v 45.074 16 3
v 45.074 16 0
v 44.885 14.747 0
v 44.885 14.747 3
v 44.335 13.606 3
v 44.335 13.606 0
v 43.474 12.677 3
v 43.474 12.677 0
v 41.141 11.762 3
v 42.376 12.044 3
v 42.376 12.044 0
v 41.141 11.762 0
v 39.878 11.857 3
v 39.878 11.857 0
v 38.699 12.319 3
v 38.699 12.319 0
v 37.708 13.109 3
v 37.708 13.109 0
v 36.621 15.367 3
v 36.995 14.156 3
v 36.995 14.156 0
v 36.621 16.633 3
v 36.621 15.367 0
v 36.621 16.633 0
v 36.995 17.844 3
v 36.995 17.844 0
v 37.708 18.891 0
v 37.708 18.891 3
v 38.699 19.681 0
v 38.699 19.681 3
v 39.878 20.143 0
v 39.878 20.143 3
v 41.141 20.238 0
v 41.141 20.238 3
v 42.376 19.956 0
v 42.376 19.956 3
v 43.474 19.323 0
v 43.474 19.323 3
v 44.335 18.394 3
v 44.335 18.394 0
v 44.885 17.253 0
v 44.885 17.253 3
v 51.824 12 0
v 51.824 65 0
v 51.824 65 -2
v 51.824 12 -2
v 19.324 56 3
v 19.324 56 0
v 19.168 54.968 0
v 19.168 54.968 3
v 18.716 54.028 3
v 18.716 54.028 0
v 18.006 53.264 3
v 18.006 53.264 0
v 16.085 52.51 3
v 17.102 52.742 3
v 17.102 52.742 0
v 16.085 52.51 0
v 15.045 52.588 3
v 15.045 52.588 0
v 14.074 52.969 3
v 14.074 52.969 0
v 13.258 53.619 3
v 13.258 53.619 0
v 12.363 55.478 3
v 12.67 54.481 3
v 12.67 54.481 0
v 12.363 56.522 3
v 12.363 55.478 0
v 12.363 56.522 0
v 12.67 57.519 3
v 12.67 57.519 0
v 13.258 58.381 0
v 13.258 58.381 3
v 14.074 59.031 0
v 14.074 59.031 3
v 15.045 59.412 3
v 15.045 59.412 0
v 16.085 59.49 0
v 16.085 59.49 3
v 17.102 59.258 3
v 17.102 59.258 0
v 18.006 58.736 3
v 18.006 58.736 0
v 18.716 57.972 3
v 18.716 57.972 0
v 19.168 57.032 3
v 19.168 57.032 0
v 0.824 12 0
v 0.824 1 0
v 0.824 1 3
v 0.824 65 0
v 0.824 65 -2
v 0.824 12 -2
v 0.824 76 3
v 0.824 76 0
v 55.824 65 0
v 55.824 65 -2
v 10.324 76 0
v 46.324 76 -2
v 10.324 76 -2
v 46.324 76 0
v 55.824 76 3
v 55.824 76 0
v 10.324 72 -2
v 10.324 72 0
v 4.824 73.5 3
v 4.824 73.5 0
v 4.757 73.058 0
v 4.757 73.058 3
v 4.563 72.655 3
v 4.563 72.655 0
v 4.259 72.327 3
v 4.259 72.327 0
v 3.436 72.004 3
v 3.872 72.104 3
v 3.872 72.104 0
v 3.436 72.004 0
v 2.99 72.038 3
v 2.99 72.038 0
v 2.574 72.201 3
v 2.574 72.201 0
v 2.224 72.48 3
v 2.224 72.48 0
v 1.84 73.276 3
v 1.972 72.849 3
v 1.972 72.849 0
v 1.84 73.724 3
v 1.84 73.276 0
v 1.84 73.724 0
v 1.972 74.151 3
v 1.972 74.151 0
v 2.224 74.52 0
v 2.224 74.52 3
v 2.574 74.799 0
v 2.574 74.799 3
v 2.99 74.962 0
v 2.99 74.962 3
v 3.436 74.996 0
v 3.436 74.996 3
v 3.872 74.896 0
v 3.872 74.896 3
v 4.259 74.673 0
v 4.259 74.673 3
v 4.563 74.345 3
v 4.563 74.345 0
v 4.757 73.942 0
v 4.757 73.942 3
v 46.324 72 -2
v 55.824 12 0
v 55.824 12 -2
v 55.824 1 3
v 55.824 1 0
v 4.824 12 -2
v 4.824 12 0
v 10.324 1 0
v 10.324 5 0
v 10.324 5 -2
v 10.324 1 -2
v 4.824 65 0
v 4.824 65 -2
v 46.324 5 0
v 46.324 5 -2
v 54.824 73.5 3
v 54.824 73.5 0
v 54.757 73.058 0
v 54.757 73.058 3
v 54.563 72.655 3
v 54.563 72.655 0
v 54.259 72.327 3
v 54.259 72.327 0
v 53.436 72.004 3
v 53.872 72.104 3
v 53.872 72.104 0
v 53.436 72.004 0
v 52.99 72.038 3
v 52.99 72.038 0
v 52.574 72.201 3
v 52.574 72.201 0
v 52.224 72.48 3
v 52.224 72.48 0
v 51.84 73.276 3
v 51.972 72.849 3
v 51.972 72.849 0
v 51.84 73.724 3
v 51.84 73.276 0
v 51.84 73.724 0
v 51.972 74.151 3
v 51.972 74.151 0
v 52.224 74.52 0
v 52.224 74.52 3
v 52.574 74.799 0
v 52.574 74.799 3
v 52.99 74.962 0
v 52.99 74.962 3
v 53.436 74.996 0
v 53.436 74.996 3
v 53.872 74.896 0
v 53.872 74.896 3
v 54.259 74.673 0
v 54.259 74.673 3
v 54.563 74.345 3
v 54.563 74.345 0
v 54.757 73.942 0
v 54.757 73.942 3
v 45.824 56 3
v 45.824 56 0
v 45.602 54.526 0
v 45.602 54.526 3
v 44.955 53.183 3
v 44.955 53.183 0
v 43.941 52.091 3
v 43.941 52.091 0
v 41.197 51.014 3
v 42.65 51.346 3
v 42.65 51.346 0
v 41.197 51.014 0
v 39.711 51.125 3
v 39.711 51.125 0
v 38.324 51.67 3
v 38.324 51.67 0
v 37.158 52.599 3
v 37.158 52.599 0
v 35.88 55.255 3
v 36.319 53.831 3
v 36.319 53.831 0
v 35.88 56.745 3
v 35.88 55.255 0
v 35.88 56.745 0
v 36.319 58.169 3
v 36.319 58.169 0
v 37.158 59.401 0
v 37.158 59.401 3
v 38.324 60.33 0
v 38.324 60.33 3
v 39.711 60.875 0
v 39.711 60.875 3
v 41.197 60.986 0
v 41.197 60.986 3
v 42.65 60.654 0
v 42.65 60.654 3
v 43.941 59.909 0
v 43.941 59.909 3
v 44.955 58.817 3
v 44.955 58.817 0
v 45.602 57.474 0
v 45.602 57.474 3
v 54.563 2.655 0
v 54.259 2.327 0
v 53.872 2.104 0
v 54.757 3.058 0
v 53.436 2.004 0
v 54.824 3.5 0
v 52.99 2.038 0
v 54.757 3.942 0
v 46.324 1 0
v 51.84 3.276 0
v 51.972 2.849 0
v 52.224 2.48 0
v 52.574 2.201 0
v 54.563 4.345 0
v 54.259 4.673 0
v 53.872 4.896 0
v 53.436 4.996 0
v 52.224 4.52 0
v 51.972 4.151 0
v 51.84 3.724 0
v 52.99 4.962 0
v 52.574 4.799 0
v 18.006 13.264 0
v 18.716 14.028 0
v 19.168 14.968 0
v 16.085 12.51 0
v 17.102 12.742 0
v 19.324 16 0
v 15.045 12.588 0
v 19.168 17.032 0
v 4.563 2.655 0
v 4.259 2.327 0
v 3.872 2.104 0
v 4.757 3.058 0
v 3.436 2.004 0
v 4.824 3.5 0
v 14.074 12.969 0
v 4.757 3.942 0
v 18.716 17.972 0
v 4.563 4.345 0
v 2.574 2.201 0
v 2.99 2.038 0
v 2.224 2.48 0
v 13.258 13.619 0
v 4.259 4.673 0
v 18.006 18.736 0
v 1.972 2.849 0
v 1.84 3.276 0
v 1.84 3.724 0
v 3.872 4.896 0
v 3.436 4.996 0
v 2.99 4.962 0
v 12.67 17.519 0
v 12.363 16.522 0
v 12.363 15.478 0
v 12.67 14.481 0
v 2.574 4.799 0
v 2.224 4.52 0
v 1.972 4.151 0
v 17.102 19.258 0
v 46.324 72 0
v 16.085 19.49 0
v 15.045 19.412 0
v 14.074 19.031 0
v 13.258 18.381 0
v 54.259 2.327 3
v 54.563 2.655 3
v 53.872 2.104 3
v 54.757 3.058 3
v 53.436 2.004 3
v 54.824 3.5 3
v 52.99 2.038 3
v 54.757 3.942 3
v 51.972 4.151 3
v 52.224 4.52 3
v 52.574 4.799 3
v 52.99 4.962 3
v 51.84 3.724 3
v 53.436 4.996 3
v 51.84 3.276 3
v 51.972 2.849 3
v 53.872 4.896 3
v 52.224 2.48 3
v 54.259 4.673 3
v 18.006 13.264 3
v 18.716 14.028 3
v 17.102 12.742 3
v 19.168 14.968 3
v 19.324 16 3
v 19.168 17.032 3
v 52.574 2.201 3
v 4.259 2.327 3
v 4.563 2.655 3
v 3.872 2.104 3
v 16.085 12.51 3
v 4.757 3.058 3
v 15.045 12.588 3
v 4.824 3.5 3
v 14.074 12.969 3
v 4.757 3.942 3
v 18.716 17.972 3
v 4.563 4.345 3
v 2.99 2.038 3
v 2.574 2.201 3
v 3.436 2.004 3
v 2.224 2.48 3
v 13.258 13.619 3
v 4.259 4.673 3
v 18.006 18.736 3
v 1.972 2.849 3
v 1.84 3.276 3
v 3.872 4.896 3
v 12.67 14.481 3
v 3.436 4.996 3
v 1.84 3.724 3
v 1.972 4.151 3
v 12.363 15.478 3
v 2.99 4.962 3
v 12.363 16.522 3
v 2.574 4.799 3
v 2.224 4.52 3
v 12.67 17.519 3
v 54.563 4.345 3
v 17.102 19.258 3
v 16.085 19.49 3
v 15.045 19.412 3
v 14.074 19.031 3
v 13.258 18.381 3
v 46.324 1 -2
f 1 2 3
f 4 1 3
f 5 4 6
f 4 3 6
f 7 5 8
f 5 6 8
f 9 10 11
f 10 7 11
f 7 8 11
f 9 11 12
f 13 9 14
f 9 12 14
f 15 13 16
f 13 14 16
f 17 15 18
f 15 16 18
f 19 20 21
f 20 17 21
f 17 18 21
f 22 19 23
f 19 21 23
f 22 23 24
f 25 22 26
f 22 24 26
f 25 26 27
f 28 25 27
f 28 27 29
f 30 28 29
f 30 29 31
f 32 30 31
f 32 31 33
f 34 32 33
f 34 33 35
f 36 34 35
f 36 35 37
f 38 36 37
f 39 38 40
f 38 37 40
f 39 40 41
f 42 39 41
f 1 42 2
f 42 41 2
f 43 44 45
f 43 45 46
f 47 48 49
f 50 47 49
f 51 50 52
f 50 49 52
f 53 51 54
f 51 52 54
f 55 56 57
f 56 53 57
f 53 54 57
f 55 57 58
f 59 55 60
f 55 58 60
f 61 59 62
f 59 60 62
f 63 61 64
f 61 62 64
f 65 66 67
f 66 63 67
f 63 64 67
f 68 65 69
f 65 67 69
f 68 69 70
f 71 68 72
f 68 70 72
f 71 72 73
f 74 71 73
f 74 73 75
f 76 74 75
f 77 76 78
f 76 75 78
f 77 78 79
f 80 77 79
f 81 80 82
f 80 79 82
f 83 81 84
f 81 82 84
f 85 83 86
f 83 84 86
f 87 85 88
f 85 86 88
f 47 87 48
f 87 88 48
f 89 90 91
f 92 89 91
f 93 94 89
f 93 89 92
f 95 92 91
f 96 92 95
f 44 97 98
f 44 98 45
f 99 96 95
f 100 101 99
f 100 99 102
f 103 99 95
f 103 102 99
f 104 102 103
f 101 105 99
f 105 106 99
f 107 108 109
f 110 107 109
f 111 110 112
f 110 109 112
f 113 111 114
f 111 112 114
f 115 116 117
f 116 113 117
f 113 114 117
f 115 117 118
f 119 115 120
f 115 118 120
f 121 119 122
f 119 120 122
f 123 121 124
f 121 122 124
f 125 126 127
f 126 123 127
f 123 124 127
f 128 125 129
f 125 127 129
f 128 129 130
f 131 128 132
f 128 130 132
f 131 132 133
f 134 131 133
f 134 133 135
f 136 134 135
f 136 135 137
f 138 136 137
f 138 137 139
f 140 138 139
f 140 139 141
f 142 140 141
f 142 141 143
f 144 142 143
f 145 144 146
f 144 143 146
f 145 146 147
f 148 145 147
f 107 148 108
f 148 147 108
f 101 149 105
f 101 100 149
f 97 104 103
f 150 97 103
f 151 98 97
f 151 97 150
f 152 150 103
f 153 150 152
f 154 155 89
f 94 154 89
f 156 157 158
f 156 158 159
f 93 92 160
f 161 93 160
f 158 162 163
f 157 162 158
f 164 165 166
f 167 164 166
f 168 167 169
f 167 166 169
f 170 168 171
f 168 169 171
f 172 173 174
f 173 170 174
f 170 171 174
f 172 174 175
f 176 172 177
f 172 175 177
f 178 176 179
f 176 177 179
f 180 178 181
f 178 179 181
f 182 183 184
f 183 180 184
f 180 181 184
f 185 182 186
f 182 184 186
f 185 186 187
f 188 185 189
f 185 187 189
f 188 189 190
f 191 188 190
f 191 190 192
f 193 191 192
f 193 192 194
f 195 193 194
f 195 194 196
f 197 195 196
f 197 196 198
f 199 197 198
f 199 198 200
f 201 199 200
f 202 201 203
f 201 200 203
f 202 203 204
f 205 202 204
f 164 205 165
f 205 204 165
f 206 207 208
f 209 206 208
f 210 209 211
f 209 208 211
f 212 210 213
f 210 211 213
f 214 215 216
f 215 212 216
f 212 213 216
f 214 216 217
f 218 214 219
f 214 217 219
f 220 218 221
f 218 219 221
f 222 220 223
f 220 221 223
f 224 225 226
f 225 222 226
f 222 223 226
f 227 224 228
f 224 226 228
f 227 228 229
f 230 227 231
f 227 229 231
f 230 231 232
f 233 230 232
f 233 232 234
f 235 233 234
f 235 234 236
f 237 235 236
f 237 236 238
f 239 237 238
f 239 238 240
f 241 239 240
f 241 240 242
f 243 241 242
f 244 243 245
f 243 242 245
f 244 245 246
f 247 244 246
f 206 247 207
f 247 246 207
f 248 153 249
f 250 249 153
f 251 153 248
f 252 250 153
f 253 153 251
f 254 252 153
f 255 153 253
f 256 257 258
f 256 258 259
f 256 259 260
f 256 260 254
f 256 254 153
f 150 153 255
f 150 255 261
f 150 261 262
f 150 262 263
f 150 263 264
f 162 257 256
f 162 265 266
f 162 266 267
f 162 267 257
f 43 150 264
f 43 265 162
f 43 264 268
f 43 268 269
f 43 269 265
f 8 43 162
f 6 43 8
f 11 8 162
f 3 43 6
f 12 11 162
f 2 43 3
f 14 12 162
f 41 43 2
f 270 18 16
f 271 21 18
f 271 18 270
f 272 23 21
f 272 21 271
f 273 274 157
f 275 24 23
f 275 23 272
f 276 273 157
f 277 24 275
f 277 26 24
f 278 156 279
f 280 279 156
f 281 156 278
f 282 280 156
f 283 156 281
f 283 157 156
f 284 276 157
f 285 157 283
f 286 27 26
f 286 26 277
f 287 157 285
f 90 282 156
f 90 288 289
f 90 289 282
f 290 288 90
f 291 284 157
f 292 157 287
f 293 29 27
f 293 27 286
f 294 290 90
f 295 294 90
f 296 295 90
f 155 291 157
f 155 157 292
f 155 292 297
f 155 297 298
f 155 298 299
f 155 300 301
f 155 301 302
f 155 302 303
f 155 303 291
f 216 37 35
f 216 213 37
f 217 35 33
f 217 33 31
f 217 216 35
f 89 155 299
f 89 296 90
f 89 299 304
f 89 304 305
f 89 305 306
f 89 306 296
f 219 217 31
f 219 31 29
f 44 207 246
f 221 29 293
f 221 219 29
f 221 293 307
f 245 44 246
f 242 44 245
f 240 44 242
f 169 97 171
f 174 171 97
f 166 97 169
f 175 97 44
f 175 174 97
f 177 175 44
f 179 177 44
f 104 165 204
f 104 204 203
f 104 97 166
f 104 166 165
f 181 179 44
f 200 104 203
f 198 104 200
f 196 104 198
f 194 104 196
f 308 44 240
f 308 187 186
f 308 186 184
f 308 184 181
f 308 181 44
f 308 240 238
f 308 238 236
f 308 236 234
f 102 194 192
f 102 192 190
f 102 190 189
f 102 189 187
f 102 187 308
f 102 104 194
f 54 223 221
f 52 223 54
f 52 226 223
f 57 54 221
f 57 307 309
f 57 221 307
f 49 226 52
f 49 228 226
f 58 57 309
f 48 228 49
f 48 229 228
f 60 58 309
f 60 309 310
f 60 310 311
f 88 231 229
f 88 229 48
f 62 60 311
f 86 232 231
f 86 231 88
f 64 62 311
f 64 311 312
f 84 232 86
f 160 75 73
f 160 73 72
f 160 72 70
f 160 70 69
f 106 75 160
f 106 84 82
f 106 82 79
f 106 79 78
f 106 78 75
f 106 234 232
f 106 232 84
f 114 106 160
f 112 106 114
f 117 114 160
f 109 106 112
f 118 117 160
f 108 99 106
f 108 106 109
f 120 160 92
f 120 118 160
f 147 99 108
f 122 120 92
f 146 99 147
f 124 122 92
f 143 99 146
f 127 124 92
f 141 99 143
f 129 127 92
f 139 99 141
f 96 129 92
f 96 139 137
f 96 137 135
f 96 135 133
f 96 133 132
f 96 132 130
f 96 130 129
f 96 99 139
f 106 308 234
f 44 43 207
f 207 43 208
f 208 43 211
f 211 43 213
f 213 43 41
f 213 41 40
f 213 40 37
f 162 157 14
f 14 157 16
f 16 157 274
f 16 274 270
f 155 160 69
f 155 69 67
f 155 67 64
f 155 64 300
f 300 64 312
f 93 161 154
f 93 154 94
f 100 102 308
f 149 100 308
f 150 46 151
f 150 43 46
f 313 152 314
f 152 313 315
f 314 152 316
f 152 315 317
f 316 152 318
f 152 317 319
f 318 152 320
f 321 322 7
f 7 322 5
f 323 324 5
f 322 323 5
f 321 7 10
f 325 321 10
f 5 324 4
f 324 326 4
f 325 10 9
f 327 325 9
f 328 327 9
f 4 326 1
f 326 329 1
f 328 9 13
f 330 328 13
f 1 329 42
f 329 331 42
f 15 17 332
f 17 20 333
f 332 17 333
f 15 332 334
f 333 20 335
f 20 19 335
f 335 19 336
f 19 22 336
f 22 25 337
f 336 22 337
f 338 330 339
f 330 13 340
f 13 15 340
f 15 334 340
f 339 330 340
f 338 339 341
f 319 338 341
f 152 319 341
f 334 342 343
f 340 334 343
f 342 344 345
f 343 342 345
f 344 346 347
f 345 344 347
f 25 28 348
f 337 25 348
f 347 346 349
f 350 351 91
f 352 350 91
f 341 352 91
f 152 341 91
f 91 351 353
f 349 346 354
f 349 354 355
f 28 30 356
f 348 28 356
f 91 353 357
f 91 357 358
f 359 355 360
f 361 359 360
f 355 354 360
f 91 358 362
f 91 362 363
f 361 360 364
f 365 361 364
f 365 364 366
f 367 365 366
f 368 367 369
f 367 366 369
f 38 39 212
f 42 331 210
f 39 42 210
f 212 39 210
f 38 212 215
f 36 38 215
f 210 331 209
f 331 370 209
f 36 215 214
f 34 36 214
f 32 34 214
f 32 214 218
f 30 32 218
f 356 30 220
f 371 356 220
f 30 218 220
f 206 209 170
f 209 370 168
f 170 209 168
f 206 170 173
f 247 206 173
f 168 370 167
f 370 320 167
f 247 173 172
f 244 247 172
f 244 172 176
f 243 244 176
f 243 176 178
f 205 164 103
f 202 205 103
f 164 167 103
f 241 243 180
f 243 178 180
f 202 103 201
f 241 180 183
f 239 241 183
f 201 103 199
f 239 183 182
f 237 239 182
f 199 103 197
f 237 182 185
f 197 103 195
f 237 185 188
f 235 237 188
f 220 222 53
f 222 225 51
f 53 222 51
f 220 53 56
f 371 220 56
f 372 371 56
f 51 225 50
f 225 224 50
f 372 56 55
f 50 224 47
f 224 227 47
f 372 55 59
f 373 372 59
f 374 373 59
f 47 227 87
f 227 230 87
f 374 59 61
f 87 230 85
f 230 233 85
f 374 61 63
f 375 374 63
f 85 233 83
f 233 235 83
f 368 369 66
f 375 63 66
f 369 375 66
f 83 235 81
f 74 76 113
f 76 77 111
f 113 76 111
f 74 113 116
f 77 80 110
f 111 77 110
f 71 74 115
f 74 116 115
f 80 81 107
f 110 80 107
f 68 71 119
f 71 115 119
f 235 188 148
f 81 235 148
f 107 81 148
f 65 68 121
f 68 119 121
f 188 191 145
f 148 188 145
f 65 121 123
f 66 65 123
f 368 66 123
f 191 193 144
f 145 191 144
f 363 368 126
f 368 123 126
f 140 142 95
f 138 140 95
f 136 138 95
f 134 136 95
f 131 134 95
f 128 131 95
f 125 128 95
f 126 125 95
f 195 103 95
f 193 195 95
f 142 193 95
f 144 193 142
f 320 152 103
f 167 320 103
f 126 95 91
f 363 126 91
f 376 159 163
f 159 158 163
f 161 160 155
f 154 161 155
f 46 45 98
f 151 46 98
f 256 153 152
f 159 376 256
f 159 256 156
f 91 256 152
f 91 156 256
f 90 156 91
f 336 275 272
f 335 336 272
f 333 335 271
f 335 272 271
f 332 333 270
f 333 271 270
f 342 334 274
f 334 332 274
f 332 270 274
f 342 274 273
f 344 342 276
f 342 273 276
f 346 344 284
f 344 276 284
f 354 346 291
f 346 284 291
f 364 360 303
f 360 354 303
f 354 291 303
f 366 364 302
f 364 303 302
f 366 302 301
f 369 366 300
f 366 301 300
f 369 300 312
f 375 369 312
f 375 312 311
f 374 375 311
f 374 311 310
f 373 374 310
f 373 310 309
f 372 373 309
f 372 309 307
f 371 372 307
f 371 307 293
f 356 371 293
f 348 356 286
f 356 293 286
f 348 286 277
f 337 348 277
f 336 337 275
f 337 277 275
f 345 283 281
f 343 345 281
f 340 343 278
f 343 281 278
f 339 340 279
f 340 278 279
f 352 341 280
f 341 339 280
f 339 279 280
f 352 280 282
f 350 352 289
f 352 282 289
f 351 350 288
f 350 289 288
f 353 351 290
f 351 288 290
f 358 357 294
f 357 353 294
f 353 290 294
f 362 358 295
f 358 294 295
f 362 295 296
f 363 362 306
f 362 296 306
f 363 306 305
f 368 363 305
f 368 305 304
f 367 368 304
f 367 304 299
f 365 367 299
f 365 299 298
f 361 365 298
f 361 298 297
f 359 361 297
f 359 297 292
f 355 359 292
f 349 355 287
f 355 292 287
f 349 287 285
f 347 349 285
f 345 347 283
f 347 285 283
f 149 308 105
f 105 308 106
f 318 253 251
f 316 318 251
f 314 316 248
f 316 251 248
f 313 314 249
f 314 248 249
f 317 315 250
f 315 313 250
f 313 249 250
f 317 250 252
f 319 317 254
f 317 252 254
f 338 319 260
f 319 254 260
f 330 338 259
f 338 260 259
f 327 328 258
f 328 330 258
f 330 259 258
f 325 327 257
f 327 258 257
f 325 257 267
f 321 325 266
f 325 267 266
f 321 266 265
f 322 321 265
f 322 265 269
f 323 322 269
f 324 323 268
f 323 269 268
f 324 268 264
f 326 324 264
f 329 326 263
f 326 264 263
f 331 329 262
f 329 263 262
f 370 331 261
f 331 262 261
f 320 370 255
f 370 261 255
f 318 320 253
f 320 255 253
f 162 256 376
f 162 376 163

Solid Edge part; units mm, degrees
sketch "Sketch1" plane through (0, 0, 0) normal (0, 0, 1) x (1, 0, 0)
  circle A0 centre (15.8237, 56) radius 3.5
  circle A1 centre (15.8237, 16) radius 3.5
  circle A2 centre (40.8237, 16) radius 4.25
  circle A3 centre (40.8237, 56) radius 5
  line L0 (0.8237, 1) -> (0.8237, 76)
  line L1 (0.8237, 76) -> (55.8237, 76)
  line L2 (55.8237, 76) -> (55.8237, 1)
  line L3 (55.8237, 1) -> (0.8237, 1)
  circle A4 centre (3.3237, 73.5) radius 1.5
  circle A5 centre (53.3237, 73.5) radius 1.5
  circle A6 centre (3.3237, 3.5) radius 1.5
  circle A7 centre (53.3237, 3.5) radius 1.5
  dimension "D1" = 5
  dimension "D2" = 5
  dimension "D3" = 5
  dimension "D4" = 5
  dimension "D5" = 5
  dimension "D6" = 5
  dimension "D7" = 5
  dimension "D8" = 5
  dimension "D9" = 55
  dimension "D10" = 75
  dimension "D11" = 15
  dimension "D12" = 20
  dimension "D13" = 15
  dimension "D14" = 15
  dimension "D15" = 15
  dimension "D16" = 15
  dimension "D17" = 15
  dimension "D18" = 25
  dimension "D19" = 15
  dimension "D20" = 15
  dimension "D21" = 25
  dimension "D22" = 53
  dimension "D23" = 4
  dimension "D24" = 36
  dimension "D25" = 4
extrude "Protrusion1" add sketch "Sketch1" along normal blind 3
sketch "Sketch2" plane through (0, 0, 0) normal (0, 0, 1) x (1, 0, 0)
  line L0 (46.3237, 72) -> (10.3237, 72)
  line L1 (10.3237, 72) -> (10.3237, 76)
  line L2 (10.3237, 76) -> (46.3237, 76)
  line L3 (46.3237, 76) -> (46.3237, 72)
  line L4 (0.8237, 65) -> (4.8237, 65)
  line L5 (4.8237, 65) -> (4.8237, 12)
  line L6 (4.8237, 12) -> (0.8237, 12)
  line L7 (0.8237, 12) -> (0.8237, 65)
  line L8 (55.8237, 65) -> (51.8237, 65)
  line L9 (51.8237, 65) -> (51.8237, 12)
  line L10 (51.8237, 12) -> (55.8237, 12)
  line L11 (55.8237, 12) -> (55.8237, 65)
  line L12 (46.3237, 5) -> (10.3237, 5)
  line L13 (10.3237, 5) -> (10.3237, 1)
  line L14 (10.3237, 1) -> (46.3237, 1)
  line L15 (46.3237, 1) -> (46.3237, 5)
  dimension "D1" = 5
  dimension "D2" = 5
  dimension "D3" = 5
  dimension "D4" = 5
  dimension "D5" = 5
  dimension "D6" = 5
  dimension "D7" = 5
  dimension "D8" = 5
  dimension "D9" = 55
  dimension "D10" = 75
  dimension "D11" = 15
  dimension "D12" = 20
  dimension "D13" = 15
  dimension "D14" = 15
  dimension "D15" = 15
  dimension "D16" = 15
  dimension "D17" = 15
  dimension "D18" = 25
  dimension "D19" = 15
  dimension "D20" = 15
  dimension "D21" = 25
  dimension "D22" = 53
  dimension "D23" = 4
  dimension "D24" = 36
  dimension "D25" = 4
extrude "ExtrudedProtrusion_3" add sketch "Sketch2" against normal blind 2
